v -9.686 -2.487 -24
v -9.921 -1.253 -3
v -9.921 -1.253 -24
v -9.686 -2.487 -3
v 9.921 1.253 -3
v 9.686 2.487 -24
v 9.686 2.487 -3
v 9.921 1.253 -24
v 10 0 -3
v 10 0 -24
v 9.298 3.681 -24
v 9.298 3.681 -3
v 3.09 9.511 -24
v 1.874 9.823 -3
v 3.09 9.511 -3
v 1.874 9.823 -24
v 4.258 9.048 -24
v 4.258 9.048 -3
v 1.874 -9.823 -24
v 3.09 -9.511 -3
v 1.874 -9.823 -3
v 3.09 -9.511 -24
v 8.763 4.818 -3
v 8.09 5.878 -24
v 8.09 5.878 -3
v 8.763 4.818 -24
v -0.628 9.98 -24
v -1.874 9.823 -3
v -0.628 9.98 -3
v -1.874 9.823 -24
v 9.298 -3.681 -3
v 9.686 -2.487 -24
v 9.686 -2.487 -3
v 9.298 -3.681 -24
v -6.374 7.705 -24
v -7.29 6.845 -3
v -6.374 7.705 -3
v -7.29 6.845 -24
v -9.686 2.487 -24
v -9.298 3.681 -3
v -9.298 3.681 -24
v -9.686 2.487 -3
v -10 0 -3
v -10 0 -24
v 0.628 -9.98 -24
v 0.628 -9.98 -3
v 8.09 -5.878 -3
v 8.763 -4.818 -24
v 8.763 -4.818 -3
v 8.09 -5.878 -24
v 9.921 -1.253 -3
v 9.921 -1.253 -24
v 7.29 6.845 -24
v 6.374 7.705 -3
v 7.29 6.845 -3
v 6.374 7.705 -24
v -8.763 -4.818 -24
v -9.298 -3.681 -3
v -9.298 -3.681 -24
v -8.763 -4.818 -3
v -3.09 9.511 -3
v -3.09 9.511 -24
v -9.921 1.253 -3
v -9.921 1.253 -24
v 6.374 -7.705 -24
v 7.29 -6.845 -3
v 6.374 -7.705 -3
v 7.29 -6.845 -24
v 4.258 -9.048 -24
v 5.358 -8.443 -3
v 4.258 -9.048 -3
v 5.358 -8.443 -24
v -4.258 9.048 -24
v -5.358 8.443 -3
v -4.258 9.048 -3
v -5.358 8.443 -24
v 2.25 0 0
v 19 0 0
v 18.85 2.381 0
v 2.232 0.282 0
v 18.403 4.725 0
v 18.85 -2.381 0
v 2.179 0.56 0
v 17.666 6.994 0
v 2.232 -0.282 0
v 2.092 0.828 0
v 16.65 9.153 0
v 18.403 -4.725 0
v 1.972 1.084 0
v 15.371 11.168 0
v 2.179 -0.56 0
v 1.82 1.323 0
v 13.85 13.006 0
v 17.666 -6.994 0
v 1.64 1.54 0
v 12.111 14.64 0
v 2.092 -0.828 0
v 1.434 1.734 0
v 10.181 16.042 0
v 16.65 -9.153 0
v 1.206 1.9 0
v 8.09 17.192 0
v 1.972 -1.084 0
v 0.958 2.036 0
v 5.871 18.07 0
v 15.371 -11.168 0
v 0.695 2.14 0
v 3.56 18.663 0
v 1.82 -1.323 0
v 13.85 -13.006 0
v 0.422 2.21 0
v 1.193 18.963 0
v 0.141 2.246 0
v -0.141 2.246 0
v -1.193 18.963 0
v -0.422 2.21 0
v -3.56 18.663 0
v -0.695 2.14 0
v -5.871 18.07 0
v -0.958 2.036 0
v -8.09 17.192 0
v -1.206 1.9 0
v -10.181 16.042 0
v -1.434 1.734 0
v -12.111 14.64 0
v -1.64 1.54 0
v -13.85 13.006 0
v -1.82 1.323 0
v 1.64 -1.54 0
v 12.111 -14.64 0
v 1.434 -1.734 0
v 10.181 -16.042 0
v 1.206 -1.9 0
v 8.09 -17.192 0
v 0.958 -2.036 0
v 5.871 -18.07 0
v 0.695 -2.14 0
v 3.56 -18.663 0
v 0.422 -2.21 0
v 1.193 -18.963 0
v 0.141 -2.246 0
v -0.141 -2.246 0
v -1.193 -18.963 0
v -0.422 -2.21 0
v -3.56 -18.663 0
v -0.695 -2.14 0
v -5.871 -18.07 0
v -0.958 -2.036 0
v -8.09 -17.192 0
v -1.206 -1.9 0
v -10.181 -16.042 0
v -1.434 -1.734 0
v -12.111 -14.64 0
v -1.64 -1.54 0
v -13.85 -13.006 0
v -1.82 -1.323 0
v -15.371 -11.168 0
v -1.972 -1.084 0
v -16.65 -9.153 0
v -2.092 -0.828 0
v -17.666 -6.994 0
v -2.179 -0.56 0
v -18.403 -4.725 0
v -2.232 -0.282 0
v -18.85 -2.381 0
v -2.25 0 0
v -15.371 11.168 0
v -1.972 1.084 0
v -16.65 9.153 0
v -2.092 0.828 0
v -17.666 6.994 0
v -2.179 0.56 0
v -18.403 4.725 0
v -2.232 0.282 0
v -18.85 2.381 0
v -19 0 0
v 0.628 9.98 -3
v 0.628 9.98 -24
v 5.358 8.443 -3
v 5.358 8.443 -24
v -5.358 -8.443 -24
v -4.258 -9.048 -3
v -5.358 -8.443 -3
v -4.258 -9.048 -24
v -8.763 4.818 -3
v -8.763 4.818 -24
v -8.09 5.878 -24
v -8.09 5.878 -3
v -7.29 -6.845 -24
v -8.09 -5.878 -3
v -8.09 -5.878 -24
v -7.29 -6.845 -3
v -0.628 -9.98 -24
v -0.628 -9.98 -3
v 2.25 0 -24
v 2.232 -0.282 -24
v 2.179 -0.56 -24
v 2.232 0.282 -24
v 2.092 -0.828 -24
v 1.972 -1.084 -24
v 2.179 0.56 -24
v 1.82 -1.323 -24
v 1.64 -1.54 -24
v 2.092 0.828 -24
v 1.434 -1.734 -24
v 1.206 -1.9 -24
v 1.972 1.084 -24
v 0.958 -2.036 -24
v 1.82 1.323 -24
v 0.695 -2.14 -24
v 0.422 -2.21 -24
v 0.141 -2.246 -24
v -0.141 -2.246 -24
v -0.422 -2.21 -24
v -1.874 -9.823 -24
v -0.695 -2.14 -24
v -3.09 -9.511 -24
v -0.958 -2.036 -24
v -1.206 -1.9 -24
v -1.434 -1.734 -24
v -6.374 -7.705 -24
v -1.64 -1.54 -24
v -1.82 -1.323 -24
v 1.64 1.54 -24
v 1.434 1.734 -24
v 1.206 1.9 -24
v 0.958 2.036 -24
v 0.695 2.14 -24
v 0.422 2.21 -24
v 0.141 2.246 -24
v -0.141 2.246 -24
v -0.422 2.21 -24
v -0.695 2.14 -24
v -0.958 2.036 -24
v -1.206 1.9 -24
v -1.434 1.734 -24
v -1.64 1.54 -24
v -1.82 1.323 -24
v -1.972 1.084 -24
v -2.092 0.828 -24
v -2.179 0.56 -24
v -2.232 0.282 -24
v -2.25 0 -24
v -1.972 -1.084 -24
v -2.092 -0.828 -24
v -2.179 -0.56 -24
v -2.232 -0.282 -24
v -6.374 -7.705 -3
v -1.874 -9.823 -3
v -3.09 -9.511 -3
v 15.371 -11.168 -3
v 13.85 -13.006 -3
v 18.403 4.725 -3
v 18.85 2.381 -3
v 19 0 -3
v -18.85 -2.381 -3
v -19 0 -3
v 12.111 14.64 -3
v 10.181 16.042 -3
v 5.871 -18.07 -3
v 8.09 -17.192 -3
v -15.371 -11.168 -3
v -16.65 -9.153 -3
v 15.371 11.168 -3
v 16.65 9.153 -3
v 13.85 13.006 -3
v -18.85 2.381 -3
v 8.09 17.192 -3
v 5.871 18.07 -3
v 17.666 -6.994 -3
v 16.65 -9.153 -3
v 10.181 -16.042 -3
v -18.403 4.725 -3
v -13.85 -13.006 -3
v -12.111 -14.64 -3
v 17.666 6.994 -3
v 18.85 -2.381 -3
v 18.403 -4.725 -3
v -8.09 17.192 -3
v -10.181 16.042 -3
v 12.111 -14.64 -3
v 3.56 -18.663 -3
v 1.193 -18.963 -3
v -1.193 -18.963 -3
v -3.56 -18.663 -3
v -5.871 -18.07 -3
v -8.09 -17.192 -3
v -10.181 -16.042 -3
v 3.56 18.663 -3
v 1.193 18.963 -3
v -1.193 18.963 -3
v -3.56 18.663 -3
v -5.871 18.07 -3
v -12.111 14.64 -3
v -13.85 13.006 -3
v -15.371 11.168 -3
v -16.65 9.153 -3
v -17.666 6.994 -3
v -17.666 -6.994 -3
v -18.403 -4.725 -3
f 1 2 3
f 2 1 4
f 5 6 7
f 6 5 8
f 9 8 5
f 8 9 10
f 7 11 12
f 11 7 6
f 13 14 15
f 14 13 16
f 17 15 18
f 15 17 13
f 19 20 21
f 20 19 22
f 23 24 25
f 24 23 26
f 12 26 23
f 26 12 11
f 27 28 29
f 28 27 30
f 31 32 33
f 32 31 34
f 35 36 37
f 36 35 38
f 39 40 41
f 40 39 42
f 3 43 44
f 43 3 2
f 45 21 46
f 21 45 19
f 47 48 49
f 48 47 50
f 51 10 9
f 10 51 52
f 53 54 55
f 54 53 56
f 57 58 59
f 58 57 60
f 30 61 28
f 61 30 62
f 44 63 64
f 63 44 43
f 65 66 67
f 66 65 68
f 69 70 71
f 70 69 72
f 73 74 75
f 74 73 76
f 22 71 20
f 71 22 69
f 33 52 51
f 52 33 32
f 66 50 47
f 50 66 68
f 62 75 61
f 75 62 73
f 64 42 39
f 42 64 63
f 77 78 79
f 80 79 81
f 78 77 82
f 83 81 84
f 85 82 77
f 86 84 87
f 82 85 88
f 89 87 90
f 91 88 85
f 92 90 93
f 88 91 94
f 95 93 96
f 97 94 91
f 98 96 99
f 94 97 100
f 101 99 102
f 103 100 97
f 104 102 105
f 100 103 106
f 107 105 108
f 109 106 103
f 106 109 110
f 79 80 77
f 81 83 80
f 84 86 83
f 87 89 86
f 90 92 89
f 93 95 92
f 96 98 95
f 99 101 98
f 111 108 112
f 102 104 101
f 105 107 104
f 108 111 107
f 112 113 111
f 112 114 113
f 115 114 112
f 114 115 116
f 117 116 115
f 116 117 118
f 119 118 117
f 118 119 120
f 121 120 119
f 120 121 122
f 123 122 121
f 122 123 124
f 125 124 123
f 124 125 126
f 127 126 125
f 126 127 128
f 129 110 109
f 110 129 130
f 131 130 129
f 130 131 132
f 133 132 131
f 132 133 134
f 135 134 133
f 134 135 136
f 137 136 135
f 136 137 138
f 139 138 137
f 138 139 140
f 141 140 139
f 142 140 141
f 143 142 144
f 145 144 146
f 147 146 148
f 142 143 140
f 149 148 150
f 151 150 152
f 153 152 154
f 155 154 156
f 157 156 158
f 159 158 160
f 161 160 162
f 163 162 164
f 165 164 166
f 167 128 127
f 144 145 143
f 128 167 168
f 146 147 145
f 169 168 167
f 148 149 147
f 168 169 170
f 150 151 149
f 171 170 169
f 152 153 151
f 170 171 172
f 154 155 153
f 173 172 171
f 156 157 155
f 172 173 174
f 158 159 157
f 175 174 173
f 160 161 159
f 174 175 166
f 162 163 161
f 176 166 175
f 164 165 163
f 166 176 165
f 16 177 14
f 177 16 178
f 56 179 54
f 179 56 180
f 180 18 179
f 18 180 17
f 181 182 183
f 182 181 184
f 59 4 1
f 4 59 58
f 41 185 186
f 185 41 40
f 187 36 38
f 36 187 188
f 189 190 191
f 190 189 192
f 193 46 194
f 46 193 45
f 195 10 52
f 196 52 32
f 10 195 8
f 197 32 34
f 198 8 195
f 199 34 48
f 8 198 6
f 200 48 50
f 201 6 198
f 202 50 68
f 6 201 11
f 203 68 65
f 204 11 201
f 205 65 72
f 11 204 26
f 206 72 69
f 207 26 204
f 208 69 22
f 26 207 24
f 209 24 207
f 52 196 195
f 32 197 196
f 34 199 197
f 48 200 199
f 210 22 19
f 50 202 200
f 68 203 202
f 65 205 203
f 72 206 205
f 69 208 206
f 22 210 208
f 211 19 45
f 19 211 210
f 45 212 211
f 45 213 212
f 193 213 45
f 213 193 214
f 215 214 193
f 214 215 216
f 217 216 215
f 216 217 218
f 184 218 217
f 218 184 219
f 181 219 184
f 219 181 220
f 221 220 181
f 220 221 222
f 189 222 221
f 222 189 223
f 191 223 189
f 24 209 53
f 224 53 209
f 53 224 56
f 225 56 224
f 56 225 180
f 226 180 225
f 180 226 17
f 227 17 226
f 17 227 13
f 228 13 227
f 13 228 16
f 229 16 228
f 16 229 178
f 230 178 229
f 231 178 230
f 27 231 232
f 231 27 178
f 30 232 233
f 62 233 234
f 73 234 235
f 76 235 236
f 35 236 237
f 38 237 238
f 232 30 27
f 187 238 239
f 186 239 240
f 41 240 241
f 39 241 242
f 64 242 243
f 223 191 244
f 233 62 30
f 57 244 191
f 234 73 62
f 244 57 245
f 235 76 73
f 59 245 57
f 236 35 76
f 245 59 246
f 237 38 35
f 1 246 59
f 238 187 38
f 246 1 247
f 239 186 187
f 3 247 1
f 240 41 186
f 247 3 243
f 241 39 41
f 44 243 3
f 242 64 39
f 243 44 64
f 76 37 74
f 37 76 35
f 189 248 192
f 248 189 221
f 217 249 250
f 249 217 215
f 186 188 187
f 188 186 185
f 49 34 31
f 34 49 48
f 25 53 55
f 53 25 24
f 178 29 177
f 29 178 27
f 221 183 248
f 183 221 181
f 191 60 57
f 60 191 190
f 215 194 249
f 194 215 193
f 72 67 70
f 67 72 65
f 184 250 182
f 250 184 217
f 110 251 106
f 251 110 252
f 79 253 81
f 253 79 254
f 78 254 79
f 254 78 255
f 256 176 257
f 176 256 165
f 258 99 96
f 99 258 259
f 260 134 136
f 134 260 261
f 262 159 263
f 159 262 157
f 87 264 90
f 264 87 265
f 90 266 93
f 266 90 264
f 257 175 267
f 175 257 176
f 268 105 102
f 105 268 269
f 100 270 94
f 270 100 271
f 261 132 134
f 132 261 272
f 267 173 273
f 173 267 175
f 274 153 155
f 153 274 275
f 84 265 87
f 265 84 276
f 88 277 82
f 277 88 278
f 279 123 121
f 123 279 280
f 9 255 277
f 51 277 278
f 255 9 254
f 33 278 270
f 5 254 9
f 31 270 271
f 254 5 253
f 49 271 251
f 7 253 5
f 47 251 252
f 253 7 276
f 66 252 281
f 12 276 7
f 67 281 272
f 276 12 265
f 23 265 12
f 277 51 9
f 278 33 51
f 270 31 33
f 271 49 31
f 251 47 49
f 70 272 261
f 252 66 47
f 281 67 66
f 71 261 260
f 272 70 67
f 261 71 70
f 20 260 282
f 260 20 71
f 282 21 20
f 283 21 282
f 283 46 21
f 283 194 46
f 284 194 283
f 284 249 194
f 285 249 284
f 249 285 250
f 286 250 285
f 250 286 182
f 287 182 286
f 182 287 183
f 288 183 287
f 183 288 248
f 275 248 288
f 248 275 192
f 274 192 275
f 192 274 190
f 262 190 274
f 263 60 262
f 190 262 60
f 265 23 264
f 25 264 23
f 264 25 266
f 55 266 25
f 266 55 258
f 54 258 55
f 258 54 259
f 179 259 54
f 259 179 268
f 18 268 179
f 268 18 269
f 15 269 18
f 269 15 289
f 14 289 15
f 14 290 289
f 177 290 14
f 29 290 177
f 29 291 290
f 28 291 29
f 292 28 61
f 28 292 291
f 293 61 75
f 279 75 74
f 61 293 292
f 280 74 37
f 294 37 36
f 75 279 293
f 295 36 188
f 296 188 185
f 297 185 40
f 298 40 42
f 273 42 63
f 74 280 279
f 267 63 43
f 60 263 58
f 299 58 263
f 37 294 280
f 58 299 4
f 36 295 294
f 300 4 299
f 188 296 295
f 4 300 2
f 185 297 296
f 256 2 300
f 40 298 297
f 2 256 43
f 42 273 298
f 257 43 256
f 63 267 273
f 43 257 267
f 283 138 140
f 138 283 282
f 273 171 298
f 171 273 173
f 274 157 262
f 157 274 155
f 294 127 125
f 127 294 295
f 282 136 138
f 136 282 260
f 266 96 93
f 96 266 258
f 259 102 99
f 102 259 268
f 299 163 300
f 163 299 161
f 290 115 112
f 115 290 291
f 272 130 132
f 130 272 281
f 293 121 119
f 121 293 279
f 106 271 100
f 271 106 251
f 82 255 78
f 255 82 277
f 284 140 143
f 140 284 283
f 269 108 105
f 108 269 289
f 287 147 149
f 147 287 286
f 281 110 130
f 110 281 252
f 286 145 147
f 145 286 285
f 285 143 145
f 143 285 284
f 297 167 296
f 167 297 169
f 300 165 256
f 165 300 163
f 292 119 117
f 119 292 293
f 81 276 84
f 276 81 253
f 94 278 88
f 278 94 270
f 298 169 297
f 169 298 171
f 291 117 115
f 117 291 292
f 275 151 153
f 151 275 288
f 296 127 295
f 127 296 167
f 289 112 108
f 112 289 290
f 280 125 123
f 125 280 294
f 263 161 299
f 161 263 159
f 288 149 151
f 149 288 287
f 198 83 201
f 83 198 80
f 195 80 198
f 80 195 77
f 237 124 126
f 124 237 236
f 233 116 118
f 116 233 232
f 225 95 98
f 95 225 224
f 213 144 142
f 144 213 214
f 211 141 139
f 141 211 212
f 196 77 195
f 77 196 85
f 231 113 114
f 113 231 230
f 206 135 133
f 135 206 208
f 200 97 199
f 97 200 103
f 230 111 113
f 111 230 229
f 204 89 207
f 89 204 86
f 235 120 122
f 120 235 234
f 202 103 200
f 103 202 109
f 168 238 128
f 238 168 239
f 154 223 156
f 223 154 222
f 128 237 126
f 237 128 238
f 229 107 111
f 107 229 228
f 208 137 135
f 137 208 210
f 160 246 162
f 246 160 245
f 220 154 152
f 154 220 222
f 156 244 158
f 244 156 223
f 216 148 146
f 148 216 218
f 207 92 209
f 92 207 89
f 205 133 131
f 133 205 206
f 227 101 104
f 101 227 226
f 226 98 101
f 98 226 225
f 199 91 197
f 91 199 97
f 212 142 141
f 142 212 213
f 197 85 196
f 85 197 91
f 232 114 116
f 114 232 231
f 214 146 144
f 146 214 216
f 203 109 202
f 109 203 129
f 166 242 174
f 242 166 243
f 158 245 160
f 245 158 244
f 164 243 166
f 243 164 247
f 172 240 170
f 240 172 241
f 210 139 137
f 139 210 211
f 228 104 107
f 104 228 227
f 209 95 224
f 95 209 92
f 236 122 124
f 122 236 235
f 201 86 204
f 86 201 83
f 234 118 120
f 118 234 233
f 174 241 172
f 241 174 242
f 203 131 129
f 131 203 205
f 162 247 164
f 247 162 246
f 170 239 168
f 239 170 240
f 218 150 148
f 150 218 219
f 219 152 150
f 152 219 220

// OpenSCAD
$fn = 50;


difference() {
	union() {
		translate(v = [0, 0, -24.0000000000]) {
			cylinder(h = 24, r = 10.0000000000);
		}
		translate(v = [0, 0, -3.0000000000]) {
			cylinder(h = 3, r = 19.0000000000);
		}
	}
	union() {
		#translate(v = [0, 0, -24]) {
			cylinder(h = 24, r = 2.2500000000);
		}
	}
}
